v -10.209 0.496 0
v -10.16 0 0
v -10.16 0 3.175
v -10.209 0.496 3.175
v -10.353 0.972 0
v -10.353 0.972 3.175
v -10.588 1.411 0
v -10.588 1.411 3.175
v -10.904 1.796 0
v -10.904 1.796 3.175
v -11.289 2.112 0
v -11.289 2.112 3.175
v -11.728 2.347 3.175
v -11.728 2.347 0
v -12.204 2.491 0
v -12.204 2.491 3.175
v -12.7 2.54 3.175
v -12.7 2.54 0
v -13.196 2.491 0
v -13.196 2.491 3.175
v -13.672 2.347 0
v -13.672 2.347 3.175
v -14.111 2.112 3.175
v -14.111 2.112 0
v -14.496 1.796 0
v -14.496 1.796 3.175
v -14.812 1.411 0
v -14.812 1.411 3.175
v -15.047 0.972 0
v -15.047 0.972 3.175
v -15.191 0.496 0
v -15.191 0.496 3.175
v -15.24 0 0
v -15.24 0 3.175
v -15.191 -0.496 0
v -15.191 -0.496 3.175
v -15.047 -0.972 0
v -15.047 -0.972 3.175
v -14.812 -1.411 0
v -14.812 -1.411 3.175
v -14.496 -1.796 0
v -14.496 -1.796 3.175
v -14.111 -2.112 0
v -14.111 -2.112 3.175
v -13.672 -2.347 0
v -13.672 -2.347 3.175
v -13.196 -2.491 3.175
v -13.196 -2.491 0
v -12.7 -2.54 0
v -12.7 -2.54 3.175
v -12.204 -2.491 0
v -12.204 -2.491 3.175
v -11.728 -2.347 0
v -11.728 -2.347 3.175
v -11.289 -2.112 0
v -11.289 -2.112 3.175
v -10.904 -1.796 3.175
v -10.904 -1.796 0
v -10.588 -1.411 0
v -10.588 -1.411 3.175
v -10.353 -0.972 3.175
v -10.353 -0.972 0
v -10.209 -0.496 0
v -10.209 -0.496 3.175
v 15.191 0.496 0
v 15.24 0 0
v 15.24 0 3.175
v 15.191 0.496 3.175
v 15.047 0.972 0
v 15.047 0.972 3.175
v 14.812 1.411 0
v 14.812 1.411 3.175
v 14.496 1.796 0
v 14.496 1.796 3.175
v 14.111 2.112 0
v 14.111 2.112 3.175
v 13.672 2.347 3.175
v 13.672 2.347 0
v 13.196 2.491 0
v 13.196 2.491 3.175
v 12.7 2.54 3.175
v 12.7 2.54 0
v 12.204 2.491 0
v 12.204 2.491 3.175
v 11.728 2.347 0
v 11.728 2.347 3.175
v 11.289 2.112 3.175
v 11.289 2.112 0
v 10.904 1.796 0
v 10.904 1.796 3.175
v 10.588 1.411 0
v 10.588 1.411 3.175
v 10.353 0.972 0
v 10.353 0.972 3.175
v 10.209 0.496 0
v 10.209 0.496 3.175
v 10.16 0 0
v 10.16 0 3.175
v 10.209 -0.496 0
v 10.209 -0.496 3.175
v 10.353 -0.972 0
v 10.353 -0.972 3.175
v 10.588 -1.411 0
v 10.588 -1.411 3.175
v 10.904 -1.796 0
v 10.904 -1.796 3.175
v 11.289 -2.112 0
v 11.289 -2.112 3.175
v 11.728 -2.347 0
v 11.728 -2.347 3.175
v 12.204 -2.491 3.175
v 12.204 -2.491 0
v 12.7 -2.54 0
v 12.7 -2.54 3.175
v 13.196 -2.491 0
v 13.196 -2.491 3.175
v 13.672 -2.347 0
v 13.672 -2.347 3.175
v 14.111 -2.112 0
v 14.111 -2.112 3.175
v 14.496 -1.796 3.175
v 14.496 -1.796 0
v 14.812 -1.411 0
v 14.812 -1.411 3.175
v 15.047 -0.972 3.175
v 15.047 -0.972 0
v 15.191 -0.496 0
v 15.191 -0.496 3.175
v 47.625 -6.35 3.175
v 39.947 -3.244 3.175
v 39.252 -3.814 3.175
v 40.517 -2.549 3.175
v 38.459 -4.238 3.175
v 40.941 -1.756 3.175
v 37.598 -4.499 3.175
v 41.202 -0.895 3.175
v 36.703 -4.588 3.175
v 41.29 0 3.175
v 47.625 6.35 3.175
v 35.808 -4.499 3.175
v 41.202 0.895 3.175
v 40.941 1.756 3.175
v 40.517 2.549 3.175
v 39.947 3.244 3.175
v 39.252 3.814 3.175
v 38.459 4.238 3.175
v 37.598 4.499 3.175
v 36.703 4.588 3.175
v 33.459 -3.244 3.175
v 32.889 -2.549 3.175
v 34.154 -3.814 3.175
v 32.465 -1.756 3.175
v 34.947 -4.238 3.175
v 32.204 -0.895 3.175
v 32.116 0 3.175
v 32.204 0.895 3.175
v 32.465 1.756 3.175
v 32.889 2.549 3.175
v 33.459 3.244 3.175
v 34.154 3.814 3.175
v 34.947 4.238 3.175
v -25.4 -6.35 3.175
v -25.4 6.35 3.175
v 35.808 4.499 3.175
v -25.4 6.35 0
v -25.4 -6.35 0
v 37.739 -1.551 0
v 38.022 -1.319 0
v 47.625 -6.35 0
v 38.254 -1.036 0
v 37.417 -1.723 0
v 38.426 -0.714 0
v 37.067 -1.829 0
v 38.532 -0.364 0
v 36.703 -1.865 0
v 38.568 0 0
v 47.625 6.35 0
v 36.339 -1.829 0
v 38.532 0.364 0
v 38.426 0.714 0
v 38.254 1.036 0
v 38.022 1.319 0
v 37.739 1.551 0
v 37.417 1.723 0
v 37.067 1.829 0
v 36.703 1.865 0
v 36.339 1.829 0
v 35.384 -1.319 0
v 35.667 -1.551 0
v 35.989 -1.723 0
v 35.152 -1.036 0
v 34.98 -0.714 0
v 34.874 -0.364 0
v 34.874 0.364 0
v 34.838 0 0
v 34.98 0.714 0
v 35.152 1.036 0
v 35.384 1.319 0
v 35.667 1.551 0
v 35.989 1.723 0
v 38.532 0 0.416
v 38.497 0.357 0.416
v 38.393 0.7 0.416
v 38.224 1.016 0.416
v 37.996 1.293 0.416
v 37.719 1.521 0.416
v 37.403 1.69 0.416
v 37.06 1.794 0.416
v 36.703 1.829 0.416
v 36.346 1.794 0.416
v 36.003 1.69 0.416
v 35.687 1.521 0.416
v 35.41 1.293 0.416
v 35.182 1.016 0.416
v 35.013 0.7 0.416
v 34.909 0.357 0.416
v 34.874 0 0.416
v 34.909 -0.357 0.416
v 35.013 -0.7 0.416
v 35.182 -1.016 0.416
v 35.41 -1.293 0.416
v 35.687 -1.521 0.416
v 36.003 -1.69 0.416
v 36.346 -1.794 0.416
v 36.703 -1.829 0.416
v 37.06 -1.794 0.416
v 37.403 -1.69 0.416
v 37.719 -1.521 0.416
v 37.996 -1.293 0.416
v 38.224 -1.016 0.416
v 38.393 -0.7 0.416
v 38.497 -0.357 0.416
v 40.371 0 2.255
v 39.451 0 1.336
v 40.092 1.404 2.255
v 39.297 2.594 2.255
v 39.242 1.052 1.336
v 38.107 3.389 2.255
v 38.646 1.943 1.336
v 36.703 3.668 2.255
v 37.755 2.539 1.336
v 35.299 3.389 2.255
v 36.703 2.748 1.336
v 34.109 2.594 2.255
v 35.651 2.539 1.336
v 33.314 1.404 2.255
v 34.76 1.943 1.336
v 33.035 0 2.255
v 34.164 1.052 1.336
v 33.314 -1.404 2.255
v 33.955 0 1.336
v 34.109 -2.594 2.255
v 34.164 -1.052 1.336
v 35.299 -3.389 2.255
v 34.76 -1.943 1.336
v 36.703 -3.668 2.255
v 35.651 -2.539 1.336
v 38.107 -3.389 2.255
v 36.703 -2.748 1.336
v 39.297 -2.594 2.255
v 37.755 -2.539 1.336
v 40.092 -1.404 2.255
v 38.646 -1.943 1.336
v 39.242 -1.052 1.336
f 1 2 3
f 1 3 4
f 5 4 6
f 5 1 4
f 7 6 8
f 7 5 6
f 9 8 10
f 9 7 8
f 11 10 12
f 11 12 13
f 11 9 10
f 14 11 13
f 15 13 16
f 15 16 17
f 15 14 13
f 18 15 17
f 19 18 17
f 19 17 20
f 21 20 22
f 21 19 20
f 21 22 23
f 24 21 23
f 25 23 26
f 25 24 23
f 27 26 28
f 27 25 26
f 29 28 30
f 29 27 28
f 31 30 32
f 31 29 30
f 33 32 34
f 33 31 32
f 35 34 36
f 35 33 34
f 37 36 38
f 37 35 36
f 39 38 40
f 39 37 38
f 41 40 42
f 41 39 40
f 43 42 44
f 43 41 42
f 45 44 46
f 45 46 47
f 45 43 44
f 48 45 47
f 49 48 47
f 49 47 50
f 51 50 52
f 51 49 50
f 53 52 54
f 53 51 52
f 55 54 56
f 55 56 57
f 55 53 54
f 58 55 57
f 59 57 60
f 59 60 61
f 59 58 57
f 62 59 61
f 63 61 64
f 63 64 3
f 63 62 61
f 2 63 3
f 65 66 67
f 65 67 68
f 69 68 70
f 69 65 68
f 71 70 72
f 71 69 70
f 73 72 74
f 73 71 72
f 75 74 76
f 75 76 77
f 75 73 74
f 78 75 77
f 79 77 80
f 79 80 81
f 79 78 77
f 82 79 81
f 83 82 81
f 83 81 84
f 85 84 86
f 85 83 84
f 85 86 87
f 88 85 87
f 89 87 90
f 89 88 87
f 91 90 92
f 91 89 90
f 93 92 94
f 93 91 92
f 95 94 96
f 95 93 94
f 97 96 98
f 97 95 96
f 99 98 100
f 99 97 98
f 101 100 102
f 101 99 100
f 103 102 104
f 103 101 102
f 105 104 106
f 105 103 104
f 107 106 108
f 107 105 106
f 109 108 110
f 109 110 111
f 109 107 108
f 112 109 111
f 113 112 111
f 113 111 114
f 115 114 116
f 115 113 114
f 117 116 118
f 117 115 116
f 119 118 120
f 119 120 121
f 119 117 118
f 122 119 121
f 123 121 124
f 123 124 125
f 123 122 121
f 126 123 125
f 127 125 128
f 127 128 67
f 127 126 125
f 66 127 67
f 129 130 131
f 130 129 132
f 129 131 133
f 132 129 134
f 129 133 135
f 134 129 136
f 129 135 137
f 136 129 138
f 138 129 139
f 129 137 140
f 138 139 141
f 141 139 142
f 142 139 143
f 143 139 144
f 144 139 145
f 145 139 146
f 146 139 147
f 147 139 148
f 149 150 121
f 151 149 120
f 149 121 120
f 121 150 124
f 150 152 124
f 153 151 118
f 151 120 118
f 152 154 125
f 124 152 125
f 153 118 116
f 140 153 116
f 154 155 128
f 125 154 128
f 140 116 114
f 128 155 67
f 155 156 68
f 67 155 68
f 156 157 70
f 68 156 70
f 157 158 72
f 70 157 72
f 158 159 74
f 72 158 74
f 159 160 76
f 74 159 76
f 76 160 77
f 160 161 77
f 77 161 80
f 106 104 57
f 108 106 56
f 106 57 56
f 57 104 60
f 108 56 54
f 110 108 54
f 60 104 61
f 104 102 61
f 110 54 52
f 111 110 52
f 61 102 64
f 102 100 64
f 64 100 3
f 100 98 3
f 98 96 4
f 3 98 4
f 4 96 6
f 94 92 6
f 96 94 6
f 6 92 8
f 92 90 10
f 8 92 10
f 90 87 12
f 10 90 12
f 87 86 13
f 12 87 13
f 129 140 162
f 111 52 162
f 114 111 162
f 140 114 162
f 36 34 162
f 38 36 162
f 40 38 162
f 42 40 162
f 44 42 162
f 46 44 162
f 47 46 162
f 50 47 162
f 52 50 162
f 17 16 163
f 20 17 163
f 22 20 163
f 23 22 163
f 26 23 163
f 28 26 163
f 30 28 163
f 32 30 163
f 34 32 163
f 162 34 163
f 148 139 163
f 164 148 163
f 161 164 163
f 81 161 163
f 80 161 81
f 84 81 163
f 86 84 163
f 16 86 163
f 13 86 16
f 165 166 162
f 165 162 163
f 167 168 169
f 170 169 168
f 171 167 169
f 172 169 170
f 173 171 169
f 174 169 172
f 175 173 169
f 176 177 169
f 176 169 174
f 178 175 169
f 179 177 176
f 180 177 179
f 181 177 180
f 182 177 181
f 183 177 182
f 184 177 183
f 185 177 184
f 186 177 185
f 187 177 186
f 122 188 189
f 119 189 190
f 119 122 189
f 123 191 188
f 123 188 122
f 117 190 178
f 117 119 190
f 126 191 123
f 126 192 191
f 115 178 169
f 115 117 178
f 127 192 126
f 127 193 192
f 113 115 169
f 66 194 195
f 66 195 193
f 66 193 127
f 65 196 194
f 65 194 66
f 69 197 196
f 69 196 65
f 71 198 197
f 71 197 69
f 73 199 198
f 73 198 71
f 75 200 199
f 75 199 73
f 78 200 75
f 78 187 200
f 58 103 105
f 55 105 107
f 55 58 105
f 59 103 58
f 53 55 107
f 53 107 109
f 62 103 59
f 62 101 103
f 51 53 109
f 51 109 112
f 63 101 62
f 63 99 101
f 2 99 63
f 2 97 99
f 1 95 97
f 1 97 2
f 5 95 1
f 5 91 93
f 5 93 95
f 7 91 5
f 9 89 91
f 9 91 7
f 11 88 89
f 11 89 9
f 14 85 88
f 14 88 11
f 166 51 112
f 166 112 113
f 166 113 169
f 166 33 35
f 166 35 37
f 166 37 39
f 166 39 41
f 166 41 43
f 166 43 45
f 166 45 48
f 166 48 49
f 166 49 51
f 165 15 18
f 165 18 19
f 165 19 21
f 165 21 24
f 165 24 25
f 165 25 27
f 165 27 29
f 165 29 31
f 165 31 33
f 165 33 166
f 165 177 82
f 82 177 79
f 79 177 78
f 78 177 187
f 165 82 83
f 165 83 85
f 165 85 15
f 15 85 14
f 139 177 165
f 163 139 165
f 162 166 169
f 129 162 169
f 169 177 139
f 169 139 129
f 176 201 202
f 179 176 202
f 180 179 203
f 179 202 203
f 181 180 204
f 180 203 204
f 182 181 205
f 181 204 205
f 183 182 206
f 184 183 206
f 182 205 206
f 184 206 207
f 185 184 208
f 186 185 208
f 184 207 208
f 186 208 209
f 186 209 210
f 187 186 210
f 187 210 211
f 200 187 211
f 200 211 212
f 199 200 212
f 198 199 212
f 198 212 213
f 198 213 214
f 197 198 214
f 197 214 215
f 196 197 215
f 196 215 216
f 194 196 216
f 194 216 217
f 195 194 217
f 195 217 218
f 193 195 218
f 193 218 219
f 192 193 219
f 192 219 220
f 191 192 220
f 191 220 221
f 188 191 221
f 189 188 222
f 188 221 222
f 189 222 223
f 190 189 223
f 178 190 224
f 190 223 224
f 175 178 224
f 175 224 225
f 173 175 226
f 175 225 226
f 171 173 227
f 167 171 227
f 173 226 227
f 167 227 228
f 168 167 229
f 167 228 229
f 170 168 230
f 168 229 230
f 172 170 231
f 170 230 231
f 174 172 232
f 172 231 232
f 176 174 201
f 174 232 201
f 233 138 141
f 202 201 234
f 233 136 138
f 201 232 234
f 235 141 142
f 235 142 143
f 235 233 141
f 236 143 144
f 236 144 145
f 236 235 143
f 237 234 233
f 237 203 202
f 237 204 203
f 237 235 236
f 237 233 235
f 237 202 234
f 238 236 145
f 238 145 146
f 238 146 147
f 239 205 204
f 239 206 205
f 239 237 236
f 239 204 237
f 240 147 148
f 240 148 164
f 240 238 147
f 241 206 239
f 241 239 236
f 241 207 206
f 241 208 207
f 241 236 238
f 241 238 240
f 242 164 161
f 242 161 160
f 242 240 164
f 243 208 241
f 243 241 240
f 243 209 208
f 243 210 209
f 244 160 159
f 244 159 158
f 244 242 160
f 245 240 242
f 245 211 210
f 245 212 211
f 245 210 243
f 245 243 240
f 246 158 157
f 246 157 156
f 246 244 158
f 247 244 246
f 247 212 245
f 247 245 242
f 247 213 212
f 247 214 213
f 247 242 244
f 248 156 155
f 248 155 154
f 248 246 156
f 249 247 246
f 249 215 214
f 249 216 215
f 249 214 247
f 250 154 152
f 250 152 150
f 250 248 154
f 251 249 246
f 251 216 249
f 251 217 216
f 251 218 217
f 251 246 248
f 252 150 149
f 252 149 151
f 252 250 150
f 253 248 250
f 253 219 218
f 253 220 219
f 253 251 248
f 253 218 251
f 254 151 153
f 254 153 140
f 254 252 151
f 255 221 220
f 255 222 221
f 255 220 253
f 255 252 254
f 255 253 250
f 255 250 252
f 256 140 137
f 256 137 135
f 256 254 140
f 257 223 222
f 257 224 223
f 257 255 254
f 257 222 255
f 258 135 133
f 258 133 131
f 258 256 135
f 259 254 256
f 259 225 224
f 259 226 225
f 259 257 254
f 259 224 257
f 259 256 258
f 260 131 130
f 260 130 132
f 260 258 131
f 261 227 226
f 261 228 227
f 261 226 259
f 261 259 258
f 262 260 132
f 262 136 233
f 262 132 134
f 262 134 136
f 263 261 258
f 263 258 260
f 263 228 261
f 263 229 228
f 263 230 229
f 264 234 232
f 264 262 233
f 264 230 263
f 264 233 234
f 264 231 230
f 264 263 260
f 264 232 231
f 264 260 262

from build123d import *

# Parameters (mm, degrees)
SKETCH1_R           = 2.54
BOSS_EXTRUDE1_DEPTH = 3.175
SKETCH3_R           = 1.5875
CUT_EXTRUDE1_DEPTH  = 49.15125907
CUT_EXTRUDE1_DRAFT  = 5
CHAMFER1_SIZE       = 3
CHAMFER1_SIZE2      = 2.769187039


with BuildPart() as part:
    # Sketch1 → Boss-Extrude1 (new body)
    with BuildSketch(Plane.XY):
        Polygon((47.625, 6.35), (47.625, -6.35), (25.4, -6.35), (-25.4, -6.35), (-25.4, 6.35), (25.4, 6.35), align=None)
        with Locations((12.7, 0)):
            Circle(SKETCH1_R, mode=Mode.SUBTRACT)
        with Locations((-12.7, 0)):
            Circle(SKETCH1_R, mode=Mode.SUBTRACT)
    extrude(amount=BOSS_EXTRUDE1_DEPTH)


with BuildPart() as cut_extrude1_tool:
    # Sketch3 → Cut-Extrude1 (with draft: the straight prism first)
    with BuildSketch(Plane.XY.offset(3.175)):
        with Locations((36.703, 0)):
            Circle(SKETCH3_R)
    extrude(amount=-CUT_EXTRUDE1_DEPTH)
    # Cut-Extrude1: the draft: its side faces are tilted about the plane it starts from
    cut_extrude1_sides = [cut_extrude1_tool.faces().sort_by_distance(p)[0] for p in [
        (35.1155, 0, -21.400629535),
    ]]
    draft(cut_extrude1_sides, Plane.XY.offset(3.175), CUT_EXTRUDE1_DRAFT)


with BuildPart() as part_1:
    add(part.part)

    # Cut-Extrude1: cut by cut_extrude1_tool
    add(cut_extrude1_tool.part, mode=Mode.SUBTRACT)

    # Chamfer1
    chamfer1_edges = [part_1.edges().sort_by_distance(p)[0] for p in [
        (35.1155, 0, 3.175),
    ]]
    chamfer1_side = [part_1.faces().sort_by_distance(p)[0] for p in [
        (46.883788787, 0, 3.175),
    ]]
    chamfer(chamfer1_edges, length=CHAMFER1_SIZE, length2=CHAMFER1_SIZE2, reference=chamfer1_side[0])


solid = part_1.part
